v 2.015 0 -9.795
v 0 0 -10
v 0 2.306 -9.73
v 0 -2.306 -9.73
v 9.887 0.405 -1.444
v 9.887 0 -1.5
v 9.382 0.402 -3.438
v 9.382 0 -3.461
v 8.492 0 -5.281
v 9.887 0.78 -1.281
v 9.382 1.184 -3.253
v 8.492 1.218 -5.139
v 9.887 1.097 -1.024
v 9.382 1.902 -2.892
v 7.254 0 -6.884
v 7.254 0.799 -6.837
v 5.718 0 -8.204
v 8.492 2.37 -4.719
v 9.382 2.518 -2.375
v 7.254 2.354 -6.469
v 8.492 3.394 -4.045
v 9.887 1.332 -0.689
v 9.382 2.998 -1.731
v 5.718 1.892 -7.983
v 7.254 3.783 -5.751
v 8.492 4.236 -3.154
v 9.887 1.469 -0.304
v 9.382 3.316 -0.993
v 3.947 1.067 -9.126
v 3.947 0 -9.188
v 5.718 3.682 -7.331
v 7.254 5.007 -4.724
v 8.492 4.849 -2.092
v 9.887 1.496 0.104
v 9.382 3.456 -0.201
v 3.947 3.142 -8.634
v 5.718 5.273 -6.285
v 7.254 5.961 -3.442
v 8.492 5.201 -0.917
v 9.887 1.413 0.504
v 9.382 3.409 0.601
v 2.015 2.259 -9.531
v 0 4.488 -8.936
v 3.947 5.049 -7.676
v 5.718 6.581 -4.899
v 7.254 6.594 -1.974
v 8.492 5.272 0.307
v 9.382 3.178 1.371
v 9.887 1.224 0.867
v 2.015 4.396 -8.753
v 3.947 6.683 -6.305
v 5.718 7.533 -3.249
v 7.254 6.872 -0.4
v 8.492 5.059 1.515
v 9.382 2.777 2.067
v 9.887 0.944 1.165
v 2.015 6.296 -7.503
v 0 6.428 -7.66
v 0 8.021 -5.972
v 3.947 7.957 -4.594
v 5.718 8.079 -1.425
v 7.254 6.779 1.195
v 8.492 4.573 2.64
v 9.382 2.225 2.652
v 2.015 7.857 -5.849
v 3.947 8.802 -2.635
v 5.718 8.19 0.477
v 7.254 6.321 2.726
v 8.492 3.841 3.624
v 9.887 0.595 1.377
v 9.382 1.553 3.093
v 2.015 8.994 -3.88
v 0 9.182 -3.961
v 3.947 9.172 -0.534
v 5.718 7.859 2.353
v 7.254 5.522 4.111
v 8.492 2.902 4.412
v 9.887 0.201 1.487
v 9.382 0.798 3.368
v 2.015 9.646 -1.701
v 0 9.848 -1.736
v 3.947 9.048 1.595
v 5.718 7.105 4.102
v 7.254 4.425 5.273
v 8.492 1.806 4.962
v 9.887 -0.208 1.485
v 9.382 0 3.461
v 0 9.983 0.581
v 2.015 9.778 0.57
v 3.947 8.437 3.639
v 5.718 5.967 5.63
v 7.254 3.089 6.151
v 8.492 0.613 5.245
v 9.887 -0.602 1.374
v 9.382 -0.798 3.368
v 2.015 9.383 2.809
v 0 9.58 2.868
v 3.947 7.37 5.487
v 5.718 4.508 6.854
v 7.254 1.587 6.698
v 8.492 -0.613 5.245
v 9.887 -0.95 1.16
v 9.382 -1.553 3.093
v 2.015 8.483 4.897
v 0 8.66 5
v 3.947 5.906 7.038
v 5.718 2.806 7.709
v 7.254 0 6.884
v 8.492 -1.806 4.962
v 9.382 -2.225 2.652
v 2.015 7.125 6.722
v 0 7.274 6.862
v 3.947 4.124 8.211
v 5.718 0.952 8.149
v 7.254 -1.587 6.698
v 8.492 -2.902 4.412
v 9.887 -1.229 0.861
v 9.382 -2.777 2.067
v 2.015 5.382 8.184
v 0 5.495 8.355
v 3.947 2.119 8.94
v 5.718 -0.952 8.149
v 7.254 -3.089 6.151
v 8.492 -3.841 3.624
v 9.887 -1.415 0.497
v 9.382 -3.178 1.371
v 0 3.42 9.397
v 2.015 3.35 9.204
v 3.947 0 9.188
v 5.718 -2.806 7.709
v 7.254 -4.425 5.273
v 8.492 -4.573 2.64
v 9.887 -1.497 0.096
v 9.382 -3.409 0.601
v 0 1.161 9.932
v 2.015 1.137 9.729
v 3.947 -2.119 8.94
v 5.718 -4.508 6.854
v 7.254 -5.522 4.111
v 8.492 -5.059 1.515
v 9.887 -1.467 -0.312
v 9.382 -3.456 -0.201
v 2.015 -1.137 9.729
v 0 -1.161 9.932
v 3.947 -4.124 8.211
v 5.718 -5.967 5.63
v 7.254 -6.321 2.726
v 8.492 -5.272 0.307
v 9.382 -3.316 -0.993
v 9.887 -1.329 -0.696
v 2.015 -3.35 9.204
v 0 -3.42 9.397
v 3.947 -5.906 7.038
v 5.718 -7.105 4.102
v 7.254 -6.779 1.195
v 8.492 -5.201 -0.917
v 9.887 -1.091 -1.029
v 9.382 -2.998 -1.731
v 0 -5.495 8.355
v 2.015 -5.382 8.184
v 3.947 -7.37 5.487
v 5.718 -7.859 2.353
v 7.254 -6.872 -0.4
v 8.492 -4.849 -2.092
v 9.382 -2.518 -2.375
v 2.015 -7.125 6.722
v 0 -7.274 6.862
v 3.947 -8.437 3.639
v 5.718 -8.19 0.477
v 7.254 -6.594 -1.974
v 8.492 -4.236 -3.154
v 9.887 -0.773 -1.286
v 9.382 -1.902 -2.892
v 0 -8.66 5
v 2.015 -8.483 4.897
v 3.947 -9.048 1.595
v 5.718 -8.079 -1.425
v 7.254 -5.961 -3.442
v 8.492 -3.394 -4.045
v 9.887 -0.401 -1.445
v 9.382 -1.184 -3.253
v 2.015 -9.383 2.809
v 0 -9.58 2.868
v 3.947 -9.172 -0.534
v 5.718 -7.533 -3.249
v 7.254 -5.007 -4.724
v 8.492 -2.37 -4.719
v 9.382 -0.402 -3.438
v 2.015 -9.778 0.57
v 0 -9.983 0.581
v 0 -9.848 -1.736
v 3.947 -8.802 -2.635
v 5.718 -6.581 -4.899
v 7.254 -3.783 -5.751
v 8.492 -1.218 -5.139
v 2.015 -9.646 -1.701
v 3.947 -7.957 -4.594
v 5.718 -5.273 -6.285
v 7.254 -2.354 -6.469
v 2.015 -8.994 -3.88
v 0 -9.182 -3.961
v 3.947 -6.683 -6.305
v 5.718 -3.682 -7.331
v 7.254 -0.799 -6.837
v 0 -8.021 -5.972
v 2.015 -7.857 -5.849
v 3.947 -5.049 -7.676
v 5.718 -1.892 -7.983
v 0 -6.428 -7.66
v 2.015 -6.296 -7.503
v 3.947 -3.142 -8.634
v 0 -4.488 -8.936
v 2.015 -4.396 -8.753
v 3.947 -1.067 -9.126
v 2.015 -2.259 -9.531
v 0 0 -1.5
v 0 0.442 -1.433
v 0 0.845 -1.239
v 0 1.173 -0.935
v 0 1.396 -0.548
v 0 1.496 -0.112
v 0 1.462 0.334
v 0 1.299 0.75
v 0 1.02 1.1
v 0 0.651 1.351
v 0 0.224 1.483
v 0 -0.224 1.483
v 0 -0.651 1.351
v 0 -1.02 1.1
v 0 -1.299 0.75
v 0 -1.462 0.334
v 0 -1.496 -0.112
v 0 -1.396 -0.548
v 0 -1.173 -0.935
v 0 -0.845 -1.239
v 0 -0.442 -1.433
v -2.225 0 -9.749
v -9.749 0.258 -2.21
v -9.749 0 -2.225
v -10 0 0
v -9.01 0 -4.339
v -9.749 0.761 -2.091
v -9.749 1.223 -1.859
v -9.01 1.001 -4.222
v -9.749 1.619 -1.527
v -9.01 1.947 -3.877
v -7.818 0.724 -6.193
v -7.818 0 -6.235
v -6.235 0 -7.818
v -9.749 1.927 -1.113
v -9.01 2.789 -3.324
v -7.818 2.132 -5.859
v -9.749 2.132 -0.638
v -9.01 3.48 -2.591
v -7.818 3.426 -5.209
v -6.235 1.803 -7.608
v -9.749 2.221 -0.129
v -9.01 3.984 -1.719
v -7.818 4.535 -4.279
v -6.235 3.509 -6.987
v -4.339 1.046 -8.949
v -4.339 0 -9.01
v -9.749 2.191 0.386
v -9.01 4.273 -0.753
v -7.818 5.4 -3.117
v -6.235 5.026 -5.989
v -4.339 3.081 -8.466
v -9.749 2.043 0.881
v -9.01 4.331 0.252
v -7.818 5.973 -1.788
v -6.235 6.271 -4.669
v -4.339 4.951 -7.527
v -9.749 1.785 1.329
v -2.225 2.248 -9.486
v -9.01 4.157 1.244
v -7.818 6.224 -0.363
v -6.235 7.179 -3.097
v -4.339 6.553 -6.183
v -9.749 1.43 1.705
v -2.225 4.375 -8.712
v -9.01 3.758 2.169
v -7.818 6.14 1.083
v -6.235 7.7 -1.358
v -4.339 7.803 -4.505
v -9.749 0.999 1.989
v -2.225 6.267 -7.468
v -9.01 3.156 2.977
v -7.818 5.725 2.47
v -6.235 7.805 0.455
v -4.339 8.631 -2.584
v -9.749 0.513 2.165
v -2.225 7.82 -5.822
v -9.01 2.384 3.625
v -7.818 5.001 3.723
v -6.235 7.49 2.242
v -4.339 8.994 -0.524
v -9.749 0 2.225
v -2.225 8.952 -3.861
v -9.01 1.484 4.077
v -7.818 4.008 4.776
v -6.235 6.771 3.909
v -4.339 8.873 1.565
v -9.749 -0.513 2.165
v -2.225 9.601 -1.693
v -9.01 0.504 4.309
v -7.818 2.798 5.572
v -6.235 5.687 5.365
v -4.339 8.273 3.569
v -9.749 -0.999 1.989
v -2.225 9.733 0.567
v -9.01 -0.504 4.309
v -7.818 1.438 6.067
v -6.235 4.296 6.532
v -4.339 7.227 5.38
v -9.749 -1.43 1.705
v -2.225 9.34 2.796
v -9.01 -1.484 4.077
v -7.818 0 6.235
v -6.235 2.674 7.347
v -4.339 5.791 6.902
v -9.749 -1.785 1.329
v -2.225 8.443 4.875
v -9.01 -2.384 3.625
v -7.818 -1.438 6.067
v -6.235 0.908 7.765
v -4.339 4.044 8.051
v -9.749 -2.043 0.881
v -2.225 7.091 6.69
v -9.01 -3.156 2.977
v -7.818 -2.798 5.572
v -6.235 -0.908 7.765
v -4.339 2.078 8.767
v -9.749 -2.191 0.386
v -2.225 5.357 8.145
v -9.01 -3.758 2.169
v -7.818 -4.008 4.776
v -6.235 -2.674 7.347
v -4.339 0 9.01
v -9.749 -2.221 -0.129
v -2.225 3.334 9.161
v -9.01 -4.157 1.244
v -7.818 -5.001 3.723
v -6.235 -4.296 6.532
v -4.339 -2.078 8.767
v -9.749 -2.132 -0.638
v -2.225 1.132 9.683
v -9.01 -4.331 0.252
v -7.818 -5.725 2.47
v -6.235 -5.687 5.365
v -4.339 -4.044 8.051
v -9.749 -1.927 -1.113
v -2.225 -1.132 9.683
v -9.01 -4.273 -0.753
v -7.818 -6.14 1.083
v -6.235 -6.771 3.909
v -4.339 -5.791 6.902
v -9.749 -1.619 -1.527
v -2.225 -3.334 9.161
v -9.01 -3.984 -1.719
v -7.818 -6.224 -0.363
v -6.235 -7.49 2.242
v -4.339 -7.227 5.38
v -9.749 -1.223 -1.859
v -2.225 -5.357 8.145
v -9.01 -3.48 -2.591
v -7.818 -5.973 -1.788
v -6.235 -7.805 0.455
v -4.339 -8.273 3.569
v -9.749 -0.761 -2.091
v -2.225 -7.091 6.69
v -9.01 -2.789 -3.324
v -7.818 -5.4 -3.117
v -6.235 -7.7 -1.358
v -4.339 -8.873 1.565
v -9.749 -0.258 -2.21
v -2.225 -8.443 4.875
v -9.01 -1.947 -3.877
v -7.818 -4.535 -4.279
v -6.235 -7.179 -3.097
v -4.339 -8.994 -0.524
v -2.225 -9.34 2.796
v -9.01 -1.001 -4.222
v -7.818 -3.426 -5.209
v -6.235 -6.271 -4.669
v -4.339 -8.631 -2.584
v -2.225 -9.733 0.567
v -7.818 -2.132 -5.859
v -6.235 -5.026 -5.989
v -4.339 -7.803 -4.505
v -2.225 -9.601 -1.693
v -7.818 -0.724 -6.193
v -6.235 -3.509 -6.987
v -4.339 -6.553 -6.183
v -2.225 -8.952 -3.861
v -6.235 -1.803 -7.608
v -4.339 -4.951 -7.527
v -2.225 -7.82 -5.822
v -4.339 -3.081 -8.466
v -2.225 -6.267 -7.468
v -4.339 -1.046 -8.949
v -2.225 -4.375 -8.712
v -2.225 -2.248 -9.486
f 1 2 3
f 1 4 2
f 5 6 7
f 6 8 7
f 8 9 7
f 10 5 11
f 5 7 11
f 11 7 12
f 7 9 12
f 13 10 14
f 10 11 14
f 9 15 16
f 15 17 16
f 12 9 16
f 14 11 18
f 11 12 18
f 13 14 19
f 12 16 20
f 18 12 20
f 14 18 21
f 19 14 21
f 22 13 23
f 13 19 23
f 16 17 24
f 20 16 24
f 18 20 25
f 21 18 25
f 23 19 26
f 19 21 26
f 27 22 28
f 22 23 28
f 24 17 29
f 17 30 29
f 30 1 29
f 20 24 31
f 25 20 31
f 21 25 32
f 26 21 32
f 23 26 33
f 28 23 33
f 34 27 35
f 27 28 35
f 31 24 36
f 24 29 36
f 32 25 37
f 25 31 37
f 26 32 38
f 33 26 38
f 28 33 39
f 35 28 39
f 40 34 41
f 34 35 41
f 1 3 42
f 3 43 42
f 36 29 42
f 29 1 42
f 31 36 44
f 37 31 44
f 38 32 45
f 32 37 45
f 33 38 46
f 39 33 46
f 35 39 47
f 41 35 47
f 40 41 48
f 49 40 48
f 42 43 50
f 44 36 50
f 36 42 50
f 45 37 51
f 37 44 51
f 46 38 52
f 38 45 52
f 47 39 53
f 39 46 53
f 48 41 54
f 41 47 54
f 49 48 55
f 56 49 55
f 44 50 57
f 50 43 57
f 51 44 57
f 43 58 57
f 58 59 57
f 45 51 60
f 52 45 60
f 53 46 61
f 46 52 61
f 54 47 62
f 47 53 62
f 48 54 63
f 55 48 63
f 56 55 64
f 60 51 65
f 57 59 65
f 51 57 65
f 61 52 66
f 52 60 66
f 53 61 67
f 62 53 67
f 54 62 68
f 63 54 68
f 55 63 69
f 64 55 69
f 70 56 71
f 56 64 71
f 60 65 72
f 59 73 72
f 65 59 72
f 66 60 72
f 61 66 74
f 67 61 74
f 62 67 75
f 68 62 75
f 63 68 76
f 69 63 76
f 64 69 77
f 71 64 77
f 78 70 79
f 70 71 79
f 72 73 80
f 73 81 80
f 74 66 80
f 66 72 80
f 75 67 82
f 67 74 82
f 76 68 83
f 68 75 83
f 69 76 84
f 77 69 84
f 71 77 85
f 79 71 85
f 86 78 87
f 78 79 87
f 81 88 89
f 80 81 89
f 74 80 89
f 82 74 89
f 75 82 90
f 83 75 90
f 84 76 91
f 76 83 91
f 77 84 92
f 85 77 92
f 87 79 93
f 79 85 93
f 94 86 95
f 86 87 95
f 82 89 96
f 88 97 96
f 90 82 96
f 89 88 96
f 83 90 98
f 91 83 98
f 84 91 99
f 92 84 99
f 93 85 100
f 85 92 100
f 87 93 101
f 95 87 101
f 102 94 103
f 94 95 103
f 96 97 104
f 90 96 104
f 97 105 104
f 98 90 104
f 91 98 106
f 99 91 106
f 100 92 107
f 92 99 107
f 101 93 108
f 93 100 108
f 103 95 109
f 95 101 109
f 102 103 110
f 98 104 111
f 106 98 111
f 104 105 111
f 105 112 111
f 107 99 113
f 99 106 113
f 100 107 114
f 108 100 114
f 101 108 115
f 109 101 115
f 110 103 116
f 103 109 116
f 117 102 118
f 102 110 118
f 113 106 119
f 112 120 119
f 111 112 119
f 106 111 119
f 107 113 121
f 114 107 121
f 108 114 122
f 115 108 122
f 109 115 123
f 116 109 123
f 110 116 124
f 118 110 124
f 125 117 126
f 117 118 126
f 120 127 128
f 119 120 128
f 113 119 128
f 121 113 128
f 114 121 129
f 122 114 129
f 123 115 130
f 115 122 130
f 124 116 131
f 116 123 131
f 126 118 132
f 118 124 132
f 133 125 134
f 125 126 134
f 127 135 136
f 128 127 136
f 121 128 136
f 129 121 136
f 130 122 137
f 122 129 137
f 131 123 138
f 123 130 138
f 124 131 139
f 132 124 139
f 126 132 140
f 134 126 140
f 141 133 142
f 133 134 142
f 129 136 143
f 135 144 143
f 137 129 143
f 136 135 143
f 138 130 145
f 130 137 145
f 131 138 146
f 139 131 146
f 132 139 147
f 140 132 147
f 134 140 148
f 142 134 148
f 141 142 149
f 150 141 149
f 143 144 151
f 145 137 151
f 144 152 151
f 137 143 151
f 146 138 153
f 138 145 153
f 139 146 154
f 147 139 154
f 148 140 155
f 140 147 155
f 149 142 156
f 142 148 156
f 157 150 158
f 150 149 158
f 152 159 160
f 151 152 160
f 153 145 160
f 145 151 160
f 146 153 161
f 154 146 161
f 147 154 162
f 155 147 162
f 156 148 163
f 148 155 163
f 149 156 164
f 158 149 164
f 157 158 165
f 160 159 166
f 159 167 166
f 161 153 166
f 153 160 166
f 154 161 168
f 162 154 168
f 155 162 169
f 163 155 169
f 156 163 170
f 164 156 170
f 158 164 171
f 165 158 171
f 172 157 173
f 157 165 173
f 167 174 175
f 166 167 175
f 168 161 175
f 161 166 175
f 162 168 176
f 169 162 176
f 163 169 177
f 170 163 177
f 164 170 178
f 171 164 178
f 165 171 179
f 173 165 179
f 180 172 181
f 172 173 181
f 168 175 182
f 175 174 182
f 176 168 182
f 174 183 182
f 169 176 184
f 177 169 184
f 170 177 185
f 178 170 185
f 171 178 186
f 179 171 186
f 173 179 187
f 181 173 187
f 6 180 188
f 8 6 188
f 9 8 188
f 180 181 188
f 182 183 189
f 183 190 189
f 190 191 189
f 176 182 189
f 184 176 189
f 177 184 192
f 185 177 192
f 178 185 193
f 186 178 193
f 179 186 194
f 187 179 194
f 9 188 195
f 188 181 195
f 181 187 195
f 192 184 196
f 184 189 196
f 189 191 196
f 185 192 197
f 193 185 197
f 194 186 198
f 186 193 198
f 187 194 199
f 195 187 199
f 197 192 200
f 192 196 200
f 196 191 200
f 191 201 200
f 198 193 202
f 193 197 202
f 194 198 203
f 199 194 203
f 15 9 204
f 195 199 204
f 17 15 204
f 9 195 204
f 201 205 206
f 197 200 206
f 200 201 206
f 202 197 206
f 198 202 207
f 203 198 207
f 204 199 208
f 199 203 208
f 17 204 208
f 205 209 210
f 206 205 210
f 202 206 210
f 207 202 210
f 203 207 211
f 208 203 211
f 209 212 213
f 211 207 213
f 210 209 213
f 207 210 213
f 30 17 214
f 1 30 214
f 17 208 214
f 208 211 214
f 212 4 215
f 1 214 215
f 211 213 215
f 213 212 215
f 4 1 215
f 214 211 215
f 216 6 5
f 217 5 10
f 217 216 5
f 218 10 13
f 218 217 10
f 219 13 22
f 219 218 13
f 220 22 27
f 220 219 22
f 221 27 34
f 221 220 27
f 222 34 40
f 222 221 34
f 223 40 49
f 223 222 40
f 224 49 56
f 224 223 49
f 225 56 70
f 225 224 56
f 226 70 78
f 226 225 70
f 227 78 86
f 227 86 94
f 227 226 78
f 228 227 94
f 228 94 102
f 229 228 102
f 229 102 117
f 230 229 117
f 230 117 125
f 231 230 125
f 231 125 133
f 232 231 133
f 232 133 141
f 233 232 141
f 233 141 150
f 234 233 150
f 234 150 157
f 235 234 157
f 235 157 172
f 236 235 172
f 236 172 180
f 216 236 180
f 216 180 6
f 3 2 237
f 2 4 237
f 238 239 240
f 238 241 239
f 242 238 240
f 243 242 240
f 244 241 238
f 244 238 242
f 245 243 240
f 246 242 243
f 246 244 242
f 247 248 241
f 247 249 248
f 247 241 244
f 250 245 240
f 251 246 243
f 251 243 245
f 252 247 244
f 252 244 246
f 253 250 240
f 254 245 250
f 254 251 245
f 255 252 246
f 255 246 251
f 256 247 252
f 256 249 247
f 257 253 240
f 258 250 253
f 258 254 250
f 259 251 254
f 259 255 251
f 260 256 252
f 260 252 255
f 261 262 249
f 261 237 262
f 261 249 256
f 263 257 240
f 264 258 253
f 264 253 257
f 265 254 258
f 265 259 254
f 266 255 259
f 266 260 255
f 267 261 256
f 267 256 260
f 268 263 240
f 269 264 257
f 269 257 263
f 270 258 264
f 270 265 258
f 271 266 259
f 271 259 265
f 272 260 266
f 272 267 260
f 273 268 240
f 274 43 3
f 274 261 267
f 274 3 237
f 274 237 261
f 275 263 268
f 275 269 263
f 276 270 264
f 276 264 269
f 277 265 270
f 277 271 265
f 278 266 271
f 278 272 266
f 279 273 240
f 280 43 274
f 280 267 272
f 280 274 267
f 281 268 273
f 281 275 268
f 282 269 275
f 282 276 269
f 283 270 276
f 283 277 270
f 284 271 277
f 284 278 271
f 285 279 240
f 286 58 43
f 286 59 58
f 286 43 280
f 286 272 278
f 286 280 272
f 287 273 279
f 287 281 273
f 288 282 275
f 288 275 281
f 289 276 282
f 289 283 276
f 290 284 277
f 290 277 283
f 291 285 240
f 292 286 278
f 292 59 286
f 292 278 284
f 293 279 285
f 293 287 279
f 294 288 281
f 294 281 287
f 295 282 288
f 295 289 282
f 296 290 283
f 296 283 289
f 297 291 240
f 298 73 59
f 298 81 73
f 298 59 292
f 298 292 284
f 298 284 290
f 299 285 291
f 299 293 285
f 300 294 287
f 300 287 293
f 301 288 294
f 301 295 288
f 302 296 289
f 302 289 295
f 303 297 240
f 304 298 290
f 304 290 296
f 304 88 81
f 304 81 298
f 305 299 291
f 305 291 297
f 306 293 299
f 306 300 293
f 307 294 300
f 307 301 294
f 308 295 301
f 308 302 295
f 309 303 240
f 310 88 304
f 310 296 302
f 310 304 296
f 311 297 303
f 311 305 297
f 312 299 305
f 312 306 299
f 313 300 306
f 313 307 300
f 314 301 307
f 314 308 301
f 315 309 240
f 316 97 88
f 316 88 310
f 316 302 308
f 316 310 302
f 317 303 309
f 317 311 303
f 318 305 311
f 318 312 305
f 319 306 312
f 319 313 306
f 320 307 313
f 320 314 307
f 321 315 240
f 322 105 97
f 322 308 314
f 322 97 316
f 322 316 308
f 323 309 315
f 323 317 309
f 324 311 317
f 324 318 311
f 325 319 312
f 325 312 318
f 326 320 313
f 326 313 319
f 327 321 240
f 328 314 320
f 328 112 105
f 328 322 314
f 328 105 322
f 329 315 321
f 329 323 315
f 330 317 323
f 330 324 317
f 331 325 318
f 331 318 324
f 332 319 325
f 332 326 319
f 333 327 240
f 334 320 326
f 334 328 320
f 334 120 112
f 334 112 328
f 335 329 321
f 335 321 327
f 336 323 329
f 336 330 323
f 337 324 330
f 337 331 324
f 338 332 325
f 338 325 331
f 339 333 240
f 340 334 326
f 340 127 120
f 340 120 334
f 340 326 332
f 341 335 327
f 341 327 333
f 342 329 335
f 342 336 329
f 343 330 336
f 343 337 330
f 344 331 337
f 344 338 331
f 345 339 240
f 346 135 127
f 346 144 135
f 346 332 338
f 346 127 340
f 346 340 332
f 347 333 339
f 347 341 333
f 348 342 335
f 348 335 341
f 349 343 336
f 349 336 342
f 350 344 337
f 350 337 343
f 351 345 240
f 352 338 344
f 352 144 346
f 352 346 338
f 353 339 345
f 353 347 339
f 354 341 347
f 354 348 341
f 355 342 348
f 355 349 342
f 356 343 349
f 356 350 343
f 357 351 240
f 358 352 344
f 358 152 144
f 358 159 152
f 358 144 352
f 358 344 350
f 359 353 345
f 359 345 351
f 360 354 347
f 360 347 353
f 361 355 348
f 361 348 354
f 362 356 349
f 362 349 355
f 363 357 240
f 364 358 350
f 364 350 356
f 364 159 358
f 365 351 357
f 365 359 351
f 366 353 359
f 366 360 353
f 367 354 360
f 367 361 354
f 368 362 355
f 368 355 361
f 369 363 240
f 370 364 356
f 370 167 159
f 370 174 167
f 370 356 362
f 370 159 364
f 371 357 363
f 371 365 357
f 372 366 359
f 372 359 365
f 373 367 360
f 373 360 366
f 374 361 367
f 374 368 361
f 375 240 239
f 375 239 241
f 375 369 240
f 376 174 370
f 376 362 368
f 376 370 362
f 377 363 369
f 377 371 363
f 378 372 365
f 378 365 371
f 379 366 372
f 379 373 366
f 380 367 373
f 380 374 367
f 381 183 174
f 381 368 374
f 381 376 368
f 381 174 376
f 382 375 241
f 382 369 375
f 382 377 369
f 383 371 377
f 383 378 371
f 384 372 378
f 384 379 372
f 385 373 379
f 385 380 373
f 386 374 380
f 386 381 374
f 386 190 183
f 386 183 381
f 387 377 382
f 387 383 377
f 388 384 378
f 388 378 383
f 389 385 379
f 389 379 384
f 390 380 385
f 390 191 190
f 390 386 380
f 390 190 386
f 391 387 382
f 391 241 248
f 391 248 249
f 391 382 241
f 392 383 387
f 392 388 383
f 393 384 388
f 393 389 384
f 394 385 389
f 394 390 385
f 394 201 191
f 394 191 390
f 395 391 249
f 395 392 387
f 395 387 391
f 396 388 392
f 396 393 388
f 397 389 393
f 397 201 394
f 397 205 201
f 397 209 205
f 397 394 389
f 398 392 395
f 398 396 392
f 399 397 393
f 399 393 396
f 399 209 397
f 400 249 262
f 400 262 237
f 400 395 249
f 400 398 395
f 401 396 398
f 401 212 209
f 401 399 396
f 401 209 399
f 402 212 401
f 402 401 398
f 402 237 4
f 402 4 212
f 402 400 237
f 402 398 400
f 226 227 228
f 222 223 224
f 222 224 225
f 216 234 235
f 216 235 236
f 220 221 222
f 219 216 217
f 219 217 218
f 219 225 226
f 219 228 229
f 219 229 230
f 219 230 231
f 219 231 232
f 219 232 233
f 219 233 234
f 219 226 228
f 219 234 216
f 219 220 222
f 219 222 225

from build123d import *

# Parameters (mm, degrees)
SKETCH3_R          = 1.5
CUT_EXTRUDE1_DEPTH = 10


with BuildPart() as part:
    # Sketch2 → Revolve1 (revolve)
    with BuildSketch(Plane(origin=(0, 0, 0), x_dir=(1, 0, 0), z_dir=(0, 1, 0))):
        with BuildLine():
            Line((0, 0), (10, 0))
            ThreePointArc((10, 0), (7.071067812, 7.071067812), (0, 10))
            Line((0, 10), (0, 0))
        make_face()
    revolve1 = revolve(axis=Axis((0, 0, 0), (1, 0, 0)))

    # Mirror1: Revolve1 across plane
    add(revolve1.mirror(Plane(origin=(0, 0, 0), x_dir=(0, 0, 1), z_dir=(1, 0, 0))))

    # Sketch3 → Cut-Extrude1 (cut)
    with BuildSketch(Plane(origin=(0, 0, 0), x_dir=(0, 0, -1), z_dir=(1, 0, 0))):
        Circle(SKETCH3_R)
    extrude(amount=CUT_EXTRUDE1_DEPTH, mode=Mode.SUBTRACT)


solid = part.part
